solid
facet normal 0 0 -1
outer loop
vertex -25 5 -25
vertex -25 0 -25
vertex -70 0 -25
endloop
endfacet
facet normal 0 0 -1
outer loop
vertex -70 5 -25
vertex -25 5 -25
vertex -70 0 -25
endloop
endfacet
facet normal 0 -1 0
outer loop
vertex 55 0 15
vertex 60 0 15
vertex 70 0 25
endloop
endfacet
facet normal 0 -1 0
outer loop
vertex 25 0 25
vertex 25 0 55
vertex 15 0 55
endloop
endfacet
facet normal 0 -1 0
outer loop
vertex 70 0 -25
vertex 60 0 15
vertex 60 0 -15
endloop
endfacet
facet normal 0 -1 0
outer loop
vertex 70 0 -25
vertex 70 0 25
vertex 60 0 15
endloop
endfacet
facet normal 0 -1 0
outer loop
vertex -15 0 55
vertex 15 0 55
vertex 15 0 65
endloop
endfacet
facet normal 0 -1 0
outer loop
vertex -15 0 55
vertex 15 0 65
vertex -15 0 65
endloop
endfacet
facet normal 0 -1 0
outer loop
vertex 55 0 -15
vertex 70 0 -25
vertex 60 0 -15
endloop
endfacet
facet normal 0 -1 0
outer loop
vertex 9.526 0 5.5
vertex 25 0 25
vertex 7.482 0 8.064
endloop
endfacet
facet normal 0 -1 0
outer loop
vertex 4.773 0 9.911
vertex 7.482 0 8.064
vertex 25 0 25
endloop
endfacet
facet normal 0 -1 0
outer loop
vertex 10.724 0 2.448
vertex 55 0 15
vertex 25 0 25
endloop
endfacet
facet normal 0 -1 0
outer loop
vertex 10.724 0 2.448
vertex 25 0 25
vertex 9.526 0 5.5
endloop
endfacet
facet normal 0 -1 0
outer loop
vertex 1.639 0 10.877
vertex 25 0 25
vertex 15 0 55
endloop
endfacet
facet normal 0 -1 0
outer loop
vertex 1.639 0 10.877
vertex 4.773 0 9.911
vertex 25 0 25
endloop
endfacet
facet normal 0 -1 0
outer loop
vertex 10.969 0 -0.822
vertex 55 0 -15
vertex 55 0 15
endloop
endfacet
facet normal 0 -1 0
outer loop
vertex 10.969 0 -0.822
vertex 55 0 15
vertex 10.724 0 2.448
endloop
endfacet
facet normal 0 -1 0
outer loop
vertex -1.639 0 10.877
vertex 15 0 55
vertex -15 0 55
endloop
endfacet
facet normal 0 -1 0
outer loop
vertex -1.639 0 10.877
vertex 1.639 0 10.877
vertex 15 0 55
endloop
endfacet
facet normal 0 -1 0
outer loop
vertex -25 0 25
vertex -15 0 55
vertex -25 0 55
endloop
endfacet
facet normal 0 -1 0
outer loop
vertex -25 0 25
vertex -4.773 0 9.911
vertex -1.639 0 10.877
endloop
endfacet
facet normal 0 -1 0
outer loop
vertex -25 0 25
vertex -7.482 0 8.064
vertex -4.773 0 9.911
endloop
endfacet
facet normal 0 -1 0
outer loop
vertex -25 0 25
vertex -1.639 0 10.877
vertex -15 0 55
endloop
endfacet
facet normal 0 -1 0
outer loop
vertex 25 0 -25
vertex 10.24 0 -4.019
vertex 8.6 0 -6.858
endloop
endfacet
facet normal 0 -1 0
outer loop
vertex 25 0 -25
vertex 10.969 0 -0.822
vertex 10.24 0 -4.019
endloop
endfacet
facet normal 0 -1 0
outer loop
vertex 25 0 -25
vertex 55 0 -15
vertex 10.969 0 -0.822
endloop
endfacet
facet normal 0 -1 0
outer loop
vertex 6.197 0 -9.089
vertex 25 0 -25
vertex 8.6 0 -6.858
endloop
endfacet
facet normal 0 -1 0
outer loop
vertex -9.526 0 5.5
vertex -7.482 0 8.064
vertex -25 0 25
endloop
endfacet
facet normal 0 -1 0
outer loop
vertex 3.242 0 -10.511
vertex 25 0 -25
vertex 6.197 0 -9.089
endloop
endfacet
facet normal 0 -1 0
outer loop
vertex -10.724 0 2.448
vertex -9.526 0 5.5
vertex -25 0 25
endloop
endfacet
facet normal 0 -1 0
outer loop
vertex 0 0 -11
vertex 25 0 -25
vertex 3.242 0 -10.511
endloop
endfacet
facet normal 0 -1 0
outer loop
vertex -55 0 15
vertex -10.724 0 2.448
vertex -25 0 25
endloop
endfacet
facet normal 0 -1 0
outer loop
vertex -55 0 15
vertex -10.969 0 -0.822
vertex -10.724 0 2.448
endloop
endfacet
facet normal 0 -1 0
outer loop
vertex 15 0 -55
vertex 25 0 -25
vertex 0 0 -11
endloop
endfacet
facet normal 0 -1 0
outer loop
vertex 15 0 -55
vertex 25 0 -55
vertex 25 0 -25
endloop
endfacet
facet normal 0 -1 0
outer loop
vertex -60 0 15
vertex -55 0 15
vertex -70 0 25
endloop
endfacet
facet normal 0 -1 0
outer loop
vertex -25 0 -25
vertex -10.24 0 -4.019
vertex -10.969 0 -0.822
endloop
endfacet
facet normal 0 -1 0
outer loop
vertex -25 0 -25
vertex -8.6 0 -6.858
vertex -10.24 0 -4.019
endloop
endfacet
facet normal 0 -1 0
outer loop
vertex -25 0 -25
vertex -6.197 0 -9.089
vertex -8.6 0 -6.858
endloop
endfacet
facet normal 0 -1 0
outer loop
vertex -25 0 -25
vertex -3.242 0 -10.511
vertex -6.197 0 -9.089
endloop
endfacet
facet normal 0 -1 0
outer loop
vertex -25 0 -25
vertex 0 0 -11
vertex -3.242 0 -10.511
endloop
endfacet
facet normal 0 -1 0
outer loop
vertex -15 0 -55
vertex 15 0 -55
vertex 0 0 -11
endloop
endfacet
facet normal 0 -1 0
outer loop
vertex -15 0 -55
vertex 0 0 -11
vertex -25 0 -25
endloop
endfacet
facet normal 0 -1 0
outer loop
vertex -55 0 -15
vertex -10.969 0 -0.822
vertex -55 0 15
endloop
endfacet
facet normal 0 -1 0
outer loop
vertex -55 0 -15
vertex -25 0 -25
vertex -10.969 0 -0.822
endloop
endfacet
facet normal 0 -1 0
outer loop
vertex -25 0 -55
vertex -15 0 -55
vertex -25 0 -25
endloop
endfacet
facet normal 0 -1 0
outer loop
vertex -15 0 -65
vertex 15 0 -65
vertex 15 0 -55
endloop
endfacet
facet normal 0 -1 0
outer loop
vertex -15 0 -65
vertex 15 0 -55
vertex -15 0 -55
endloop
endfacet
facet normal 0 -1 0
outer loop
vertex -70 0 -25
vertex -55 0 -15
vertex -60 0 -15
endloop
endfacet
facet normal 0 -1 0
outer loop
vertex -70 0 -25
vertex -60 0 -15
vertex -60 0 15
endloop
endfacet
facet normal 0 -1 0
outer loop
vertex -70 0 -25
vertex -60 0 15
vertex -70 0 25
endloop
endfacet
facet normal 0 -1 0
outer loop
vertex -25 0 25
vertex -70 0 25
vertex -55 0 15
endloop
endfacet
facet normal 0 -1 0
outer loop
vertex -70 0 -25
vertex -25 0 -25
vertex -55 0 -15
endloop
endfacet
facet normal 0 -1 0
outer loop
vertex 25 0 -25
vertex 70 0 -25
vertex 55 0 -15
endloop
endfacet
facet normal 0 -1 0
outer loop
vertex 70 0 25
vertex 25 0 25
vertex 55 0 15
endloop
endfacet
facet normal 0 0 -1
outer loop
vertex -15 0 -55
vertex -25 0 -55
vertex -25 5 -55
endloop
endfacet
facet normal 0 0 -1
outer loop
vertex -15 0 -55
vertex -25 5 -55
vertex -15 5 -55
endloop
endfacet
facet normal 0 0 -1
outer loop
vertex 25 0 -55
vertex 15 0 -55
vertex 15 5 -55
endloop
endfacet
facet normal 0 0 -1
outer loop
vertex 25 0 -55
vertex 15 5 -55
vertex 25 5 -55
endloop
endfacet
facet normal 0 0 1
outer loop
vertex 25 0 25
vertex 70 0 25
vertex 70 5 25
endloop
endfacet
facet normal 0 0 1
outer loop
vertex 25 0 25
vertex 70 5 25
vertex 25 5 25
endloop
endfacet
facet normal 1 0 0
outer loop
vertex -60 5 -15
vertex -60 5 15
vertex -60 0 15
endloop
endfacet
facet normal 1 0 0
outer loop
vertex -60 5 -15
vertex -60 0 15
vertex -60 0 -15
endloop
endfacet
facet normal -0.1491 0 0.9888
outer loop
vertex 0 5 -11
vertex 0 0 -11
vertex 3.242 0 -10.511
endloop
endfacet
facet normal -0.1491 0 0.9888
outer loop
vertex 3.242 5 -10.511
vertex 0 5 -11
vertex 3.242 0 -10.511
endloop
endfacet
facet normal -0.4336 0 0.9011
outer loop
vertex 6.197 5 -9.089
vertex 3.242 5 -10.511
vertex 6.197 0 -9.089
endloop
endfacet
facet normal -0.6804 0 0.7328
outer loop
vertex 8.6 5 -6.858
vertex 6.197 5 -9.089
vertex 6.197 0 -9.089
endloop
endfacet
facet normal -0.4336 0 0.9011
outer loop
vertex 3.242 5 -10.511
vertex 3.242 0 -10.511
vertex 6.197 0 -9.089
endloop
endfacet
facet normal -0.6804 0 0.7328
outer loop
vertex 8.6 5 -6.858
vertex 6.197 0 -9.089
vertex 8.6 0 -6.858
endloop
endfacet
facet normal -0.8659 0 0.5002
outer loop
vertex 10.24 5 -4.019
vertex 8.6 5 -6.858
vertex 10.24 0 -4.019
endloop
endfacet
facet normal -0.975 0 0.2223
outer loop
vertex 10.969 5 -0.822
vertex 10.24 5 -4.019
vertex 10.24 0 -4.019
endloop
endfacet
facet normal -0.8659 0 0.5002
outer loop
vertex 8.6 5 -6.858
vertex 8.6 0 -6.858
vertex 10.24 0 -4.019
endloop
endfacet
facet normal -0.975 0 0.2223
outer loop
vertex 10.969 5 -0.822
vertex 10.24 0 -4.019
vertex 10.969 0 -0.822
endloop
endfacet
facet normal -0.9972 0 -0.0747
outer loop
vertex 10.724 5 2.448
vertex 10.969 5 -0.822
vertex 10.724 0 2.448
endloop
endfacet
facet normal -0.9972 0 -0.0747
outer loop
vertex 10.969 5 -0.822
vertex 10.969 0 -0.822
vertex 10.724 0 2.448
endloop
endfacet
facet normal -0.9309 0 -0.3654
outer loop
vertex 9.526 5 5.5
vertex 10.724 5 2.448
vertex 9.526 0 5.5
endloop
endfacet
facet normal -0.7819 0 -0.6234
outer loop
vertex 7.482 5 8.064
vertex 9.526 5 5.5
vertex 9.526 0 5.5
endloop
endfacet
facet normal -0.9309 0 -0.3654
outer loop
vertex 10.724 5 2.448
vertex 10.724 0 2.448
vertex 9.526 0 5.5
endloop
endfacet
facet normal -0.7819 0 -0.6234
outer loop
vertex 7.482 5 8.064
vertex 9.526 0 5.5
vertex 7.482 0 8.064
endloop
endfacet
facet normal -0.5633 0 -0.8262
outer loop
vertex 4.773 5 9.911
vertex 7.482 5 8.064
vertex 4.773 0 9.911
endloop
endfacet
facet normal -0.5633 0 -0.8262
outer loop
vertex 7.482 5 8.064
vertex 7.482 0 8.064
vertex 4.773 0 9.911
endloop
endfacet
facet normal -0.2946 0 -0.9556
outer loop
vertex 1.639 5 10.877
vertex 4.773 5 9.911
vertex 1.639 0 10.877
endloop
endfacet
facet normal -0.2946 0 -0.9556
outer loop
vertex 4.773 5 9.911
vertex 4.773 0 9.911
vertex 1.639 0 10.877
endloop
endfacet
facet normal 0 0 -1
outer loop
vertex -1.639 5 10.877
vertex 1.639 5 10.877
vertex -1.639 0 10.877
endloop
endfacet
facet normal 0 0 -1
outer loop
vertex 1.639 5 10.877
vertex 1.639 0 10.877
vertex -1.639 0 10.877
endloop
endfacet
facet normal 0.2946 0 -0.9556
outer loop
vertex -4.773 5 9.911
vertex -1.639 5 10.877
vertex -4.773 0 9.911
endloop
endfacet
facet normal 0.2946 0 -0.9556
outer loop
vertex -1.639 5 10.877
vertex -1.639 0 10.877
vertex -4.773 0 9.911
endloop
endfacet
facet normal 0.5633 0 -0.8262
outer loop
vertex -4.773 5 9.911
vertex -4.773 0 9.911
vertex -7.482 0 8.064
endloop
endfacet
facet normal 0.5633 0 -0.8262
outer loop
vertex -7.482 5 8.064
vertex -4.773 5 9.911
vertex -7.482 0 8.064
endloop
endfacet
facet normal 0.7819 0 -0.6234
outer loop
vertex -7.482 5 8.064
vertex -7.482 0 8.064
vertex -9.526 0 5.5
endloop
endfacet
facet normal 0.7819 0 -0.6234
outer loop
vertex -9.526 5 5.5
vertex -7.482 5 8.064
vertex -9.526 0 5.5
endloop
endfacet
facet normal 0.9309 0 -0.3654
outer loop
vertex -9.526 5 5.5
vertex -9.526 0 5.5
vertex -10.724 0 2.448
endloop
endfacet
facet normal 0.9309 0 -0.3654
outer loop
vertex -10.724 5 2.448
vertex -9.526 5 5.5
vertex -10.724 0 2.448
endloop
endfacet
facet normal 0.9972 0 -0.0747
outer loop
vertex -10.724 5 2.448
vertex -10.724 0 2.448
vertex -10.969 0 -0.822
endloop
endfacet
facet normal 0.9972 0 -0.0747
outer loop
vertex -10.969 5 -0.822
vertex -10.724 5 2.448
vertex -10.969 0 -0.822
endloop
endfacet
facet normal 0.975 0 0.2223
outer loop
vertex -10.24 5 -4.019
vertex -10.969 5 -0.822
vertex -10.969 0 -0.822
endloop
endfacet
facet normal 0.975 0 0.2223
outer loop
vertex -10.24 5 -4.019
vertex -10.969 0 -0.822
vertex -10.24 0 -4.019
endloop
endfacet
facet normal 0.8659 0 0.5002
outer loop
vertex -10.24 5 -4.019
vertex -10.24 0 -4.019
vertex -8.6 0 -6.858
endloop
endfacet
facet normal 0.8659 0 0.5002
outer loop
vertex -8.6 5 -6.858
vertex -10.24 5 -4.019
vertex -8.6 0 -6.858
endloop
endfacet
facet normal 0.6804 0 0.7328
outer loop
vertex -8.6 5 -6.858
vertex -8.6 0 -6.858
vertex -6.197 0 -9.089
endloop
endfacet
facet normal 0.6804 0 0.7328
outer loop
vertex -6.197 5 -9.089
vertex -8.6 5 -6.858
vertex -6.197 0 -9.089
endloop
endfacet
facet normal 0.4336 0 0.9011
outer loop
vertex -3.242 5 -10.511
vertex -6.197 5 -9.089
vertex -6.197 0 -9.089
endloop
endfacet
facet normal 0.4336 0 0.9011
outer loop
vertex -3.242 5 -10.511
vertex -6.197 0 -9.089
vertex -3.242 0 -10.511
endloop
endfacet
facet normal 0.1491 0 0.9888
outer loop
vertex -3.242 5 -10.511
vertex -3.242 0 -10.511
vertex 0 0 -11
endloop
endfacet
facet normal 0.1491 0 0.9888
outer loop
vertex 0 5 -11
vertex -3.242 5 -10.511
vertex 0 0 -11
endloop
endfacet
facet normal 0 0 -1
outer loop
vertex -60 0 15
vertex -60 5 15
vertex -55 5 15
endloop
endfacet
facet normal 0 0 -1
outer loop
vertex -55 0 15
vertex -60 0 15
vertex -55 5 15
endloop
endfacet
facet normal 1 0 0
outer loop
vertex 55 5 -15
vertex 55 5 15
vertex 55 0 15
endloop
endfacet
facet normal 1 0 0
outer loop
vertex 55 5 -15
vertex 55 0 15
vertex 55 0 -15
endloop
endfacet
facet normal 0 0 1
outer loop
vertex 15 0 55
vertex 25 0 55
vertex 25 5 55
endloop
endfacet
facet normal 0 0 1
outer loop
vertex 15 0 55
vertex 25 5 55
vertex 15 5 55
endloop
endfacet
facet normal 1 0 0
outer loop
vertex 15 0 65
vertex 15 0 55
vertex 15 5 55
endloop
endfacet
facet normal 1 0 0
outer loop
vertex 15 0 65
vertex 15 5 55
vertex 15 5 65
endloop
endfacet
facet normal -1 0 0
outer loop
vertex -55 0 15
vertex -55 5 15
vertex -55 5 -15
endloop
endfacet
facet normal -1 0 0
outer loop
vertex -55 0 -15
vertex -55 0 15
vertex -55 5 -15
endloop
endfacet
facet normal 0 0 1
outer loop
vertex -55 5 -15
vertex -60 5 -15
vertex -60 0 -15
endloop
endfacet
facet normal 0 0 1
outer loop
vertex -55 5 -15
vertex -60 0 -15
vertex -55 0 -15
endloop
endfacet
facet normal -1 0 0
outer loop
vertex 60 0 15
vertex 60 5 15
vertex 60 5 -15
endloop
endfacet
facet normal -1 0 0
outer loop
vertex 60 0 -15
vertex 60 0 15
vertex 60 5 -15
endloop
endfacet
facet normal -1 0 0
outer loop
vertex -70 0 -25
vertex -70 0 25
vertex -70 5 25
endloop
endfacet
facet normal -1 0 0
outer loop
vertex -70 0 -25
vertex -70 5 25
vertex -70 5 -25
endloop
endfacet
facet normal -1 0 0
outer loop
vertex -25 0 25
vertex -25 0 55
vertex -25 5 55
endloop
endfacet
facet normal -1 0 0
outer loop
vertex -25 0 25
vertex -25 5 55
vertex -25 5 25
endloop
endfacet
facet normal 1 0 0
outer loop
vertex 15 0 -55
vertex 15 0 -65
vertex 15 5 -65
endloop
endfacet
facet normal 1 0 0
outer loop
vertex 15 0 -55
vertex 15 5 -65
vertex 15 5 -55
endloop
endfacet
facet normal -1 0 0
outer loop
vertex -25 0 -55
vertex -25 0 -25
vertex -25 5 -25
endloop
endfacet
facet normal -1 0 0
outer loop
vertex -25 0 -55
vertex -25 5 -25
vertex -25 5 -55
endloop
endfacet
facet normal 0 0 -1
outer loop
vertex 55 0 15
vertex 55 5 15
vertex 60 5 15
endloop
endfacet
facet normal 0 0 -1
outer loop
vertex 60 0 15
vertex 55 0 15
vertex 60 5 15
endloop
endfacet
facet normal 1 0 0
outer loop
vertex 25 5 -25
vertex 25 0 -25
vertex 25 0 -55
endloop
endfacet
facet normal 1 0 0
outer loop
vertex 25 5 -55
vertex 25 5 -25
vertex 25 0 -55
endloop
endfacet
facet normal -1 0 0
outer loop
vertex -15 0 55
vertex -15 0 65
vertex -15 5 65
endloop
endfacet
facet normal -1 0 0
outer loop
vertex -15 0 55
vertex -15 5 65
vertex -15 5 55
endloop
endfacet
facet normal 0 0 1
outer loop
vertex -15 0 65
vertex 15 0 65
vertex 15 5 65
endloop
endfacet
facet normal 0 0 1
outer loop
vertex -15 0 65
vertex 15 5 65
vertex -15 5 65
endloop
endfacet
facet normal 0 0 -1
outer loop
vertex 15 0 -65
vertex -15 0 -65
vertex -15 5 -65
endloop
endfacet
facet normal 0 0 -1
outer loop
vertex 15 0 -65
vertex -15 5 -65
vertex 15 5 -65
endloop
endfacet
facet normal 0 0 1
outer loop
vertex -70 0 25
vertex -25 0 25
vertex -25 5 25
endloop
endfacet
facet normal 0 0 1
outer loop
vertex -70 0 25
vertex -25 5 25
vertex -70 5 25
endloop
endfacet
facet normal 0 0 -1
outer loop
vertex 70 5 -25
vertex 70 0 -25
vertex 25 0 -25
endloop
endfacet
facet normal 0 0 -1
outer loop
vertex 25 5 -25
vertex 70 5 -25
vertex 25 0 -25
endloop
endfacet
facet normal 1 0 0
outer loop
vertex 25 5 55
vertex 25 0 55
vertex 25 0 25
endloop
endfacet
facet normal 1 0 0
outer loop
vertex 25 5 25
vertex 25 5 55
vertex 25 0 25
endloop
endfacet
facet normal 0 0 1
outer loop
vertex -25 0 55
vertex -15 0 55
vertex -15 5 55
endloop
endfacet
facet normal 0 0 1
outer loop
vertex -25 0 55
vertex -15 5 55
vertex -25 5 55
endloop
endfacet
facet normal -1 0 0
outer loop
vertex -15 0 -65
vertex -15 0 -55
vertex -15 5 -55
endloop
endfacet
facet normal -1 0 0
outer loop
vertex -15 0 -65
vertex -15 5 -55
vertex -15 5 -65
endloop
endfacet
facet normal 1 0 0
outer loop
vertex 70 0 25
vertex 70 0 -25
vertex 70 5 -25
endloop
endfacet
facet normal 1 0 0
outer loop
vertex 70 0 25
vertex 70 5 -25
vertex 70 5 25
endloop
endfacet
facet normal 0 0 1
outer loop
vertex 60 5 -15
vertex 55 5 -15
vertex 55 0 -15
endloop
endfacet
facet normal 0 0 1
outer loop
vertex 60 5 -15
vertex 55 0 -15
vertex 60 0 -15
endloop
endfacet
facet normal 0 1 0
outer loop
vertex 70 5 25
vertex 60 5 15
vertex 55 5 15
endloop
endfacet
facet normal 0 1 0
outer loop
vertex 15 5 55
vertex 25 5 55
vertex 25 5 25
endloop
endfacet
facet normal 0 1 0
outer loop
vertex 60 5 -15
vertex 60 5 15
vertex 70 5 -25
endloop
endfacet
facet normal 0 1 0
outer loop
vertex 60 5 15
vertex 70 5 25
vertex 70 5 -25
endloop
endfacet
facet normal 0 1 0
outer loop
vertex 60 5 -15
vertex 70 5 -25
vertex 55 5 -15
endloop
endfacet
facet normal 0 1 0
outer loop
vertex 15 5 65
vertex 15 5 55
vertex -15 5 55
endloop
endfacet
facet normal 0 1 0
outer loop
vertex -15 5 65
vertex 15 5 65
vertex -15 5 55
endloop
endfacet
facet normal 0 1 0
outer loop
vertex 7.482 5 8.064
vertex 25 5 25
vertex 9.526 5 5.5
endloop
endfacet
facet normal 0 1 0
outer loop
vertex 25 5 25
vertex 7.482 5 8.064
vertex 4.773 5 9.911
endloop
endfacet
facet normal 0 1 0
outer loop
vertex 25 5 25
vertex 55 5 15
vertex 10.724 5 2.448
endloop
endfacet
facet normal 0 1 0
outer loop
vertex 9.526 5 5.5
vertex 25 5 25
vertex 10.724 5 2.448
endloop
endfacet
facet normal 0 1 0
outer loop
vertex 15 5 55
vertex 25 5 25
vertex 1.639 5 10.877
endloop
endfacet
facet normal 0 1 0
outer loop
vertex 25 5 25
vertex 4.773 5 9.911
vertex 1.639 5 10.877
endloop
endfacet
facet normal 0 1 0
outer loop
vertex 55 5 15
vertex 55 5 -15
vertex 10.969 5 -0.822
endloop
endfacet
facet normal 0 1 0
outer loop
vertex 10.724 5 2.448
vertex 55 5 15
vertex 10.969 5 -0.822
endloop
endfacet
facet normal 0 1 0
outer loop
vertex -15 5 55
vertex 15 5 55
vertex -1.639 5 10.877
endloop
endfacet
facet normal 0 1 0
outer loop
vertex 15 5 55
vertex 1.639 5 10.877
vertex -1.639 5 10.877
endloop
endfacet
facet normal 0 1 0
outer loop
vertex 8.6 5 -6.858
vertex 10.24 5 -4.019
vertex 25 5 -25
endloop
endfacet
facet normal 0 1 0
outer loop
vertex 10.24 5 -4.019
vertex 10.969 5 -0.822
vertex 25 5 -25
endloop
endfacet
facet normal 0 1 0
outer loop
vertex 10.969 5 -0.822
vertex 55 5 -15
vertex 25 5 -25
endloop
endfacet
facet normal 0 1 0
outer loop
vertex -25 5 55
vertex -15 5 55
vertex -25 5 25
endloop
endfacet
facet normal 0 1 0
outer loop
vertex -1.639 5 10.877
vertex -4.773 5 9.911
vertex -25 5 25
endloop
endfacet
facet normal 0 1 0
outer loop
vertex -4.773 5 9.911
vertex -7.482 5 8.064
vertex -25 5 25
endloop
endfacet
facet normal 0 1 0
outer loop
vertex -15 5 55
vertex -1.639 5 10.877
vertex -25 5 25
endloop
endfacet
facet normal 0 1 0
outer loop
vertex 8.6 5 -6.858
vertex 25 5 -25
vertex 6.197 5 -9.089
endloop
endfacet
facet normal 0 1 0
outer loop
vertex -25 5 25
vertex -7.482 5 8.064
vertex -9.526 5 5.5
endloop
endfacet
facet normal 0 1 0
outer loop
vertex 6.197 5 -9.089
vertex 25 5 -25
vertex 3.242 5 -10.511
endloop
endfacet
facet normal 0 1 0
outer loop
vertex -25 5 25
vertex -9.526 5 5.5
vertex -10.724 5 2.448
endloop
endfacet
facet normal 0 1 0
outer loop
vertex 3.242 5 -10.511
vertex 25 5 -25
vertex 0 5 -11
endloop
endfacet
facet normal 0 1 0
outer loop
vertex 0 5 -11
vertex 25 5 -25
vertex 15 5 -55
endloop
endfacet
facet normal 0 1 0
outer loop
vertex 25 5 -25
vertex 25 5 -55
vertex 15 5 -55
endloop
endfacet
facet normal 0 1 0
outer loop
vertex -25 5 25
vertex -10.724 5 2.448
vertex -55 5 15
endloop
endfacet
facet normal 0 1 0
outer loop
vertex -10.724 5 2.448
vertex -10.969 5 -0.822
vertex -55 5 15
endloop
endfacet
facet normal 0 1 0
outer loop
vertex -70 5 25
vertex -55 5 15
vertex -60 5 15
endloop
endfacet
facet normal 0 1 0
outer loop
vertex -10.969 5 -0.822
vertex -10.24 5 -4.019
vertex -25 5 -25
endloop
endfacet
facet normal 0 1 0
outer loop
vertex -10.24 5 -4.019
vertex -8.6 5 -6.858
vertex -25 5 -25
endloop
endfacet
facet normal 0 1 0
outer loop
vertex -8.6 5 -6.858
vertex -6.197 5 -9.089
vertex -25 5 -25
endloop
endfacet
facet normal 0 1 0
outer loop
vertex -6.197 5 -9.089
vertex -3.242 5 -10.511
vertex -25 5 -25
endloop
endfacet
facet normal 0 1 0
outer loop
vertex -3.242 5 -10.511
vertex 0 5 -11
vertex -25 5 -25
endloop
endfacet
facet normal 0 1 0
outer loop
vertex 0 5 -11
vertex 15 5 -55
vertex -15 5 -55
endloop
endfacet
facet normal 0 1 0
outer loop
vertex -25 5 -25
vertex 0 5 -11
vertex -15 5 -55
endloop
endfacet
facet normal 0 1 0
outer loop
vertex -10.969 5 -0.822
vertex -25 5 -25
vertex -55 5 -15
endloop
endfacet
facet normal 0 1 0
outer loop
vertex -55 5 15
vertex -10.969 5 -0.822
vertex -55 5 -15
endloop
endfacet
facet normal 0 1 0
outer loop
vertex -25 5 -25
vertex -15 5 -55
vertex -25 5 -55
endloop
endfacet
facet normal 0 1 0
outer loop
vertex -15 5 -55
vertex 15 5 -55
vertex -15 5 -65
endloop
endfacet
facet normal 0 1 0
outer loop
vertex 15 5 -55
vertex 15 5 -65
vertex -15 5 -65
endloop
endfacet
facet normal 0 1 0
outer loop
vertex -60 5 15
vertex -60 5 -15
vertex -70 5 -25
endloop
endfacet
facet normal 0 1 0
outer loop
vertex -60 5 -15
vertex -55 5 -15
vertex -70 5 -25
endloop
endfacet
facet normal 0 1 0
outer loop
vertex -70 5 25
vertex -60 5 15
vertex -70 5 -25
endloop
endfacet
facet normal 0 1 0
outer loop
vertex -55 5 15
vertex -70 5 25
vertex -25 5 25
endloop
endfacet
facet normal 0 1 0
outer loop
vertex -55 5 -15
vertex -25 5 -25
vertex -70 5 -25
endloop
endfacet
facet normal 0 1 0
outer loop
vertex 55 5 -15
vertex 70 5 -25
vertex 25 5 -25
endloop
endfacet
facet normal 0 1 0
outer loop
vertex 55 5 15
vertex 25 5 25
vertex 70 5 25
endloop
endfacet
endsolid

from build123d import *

# Parameters (mm, degrees)
BOSS_EXTRUDE2_DEPTH = 5
SKETCH2_W           = 5
SKETCH2_H           = 30
CUT_EXTRUDE4_DEPTH  = 100
SKETCH3_R           = 11
CUT_EXTRUDE5_DEPTH  = 100
SKETCH5_W           = 45
SKETCH5_H           = 30
CUT_EXTRUDE6_DEPTH  = 100


with BuildPart() as part:
    # Sketch1 → Boss-Extrude2 (new body)
    with BuildSketch(Plane(origin=(0, 0, 0), x_dir=(1, 0, 0), z_dir=(0, 1, 0))):
        Polygon((70, -55), (15, -55), (15, -65), (-15, -65), (-15, -55), (-70, -55), (-70, 55), (-15, 55), (-15, 65), (15, 65), (15, 55), (70, 55), align=None)
    extrude(amount=BOSS_EXTRUDE2_DEPTH)

    # Sketch2 → Cut-Extrude4 (cut)
    with BuildSketch(Plane(origin=(0, 5, 0), x_dir=(1, 0, 0), z_dir=(0, 1, 0))):
        with Locations((-57.5, 0)):
            Rectangle(SKETCH2_W, SKETCH2_H)
        with Locations((57.5, 0)):
            Rectangle(SKETCH2_W, SKETCH2_H)
    extrude(amount=-CUT_EXTRUDE4_DEPTH, mode=Mode.SUBTRACT)

    # Sketch3 → Cut-Extrude5 (cut)
    with BuildSketch(Plane(origin=(0, 0, 0), x_dir=(-1, 0, 0), z_dir=(0, -1, 0))):
        with Locations(Location((0, 0, 0), (0, 0, 90))):
            Circle(SKETCH3_R)
    extrude(amount=-CUT_EXTRUDE5_DEPTH, mode=Mode.SUBTRACT)

    # Sketch5 → Cut-Extrude6 (cut)
    with BuildSketch(Plane(origin=(0, 0, 0), x_dir=(-1, 0, 0), z_dir=(0, -1, 0))):
        with Locations((47.5, -40)):
            Rectangle(SKETCH5_W, SKETCH5_H)
        with Locations((47.5, 40)):
            Rectangle(SKETCH5_W, SKETCH5_H)
        with Locations((-47.5, 40)):
            Rectangle(SKETCH5_W, SKETCH5_H)
        with Locations((-47.5, -40)):
            Rectangle(SKETCH5_W, SKETCH5_H)
    extrude(amount=-CUT_EXTRUDE6_DEPTH, mode=Mode.SUBTRACT)


solid = part.part
